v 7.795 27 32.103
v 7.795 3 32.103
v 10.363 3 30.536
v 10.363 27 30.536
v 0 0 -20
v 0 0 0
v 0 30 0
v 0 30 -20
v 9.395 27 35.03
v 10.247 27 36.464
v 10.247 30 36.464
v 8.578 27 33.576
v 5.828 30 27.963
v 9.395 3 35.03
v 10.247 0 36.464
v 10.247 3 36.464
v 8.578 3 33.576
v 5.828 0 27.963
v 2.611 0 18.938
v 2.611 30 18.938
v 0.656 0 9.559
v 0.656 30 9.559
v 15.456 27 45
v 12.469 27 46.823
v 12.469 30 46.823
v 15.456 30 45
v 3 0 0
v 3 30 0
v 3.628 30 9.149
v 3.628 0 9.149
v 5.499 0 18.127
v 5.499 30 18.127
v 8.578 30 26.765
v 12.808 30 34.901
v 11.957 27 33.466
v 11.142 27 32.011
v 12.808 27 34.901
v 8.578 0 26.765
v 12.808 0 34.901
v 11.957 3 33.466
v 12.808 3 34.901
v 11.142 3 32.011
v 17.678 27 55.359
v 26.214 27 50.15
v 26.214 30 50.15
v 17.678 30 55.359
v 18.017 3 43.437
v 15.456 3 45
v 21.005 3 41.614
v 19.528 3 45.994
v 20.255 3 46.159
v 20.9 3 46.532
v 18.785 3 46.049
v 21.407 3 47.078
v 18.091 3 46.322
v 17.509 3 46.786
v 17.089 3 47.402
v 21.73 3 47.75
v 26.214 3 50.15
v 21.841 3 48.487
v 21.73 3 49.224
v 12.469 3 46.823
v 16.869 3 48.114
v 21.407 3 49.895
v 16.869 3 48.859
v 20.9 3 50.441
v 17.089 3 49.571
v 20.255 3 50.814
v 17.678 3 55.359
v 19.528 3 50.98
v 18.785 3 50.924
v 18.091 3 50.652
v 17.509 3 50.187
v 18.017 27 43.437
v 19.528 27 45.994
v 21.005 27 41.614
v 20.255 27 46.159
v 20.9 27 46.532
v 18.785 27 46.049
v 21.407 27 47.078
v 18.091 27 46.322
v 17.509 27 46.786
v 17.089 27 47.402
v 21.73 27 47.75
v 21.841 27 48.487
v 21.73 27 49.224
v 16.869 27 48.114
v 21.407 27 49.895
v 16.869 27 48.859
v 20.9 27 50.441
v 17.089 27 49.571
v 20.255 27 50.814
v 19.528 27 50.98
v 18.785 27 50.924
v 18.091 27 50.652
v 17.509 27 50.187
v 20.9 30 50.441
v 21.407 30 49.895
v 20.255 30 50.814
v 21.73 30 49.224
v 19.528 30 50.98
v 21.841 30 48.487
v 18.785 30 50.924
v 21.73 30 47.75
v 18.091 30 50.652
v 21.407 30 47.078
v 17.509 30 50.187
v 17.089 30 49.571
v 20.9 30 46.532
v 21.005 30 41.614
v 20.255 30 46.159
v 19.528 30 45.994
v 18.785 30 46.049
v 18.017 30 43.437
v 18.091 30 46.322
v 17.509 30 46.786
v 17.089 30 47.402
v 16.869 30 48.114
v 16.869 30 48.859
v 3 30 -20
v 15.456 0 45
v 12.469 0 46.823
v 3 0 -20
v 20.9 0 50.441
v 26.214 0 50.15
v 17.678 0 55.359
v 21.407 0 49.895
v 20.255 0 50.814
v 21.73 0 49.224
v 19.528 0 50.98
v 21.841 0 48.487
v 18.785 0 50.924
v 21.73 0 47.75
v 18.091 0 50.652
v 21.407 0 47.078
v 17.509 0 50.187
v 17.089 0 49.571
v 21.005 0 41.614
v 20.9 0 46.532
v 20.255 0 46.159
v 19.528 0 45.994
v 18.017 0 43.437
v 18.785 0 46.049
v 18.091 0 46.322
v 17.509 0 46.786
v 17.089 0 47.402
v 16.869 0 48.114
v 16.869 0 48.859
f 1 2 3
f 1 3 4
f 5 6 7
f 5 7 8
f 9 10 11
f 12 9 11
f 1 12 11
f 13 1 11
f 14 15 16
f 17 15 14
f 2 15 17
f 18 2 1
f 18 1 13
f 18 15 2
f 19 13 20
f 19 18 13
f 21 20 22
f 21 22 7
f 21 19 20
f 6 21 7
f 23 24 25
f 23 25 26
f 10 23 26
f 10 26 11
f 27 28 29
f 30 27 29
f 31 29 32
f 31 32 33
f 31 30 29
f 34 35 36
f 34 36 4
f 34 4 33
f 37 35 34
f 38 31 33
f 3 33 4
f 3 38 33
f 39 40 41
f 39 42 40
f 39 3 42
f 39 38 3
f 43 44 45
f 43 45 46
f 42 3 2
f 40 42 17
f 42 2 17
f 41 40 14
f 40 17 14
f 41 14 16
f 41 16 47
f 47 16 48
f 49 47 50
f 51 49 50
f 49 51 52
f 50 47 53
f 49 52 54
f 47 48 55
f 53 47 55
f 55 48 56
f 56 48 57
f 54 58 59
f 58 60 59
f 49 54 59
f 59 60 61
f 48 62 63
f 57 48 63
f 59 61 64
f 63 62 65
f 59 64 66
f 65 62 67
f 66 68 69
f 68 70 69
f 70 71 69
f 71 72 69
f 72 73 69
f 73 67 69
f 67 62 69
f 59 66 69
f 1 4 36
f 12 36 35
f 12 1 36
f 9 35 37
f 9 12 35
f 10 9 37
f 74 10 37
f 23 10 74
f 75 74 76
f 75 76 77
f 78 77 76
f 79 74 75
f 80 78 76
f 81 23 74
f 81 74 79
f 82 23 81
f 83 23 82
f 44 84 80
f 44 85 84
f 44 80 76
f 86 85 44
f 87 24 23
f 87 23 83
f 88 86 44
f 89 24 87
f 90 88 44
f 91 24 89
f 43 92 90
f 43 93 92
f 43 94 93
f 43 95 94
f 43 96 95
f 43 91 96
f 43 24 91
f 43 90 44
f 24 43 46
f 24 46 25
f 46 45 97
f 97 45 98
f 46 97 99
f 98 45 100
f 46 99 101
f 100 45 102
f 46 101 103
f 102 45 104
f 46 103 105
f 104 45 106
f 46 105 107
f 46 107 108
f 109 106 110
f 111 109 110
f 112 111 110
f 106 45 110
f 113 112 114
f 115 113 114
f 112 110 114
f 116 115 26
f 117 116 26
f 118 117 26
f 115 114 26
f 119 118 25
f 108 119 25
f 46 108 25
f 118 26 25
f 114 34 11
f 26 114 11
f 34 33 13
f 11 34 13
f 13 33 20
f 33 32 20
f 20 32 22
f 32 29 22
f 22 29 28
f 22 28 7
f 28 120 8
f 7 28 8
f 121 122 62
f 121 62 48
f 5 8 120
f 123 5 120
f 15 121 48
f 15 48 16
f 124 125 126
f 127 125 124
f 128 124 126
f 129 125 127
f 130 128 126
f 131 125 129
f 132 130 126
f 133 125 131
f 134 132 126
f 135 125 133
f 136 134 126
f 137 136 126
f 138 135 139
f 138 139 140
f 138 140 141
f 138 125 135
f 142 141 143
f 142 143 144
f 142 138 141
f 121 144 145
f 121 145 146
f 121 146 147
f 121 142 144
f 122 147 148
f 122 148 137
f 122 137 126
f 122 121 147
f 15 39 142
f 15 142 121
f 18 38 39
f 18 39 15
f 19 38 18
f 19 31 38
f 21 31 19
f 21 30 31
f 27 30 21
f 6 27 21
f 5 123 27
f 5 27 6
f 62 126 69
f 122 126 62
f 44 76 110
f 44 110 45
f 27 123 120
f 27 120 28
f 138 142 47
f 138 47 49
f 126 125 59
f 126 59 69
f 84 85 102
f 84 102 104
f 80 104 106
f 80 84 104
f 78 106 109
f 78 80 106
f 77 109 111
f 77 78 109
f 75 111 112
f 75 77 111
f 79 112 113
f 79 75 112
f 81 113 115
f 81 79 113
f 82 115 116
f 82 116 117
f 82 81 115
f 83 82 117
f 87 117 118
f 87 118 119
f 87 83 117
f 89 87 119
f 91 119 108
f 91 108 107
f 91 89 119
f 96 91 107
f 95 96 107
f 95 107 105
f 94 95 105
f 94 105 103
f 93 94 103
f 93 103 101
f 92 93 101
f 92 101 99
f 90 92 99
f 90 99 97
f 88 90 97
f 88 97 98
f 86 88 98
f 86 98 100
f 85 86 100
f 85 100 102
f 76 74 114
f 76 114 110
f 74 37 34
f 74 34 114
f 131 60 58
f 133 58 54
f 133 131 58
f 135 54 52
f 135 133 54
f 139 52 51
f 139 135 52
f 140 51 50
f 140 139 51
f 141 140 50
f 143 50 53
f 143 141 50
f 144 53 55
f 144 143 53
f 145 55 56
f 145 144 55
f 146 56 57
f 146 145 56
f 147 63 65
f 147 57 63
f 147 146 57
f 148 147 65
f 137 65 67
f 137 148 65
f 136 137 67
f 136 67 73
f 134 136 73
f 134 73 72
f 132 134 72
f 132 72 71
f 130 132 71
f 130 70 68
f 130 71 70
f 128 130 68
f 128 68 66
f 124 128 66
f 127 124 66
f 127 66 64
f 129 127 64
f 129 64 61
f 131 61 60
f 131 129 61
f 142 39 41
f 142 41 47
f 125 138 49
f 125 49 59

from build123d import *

# Parameters (mm, degrees)
ESQUISSE1_R      = 2.5
EXTRUSION1_DEPTH = 30
ESQUISSE3_W      = 25
ESQUISSE3_H      = 24
EXTRUSION2_DEPTH = 47.542124281


with BuildPart() as part:
    # Esquisse1 → Extrusion1 (new body)
    with BuildSketch(Plane(origin=(0, 0, 0), x_dir=(1, 0, 0), z_dir=(0, 1, 0))):
        with BuildLine():
            Line((0, 0), (0, 20))
            Line((0, 20), (3, 20))
            Line((3, 20), (3, 0))
            ThreePointArc((3, 0), (5.498625566, -18.126574307), (12.808140182, -34.901162883))
            Line((12.808140182, -34.901162883), (18.017268971, -43.437261363))
            Line((18.017268971, -43.437261363), (21.004903439, -41.614066287))
            Line((21.004903439, -41.614066287), (26.214032228, -50.150164768))
            Line((26.214032228, -50.150164768), (17.677933747, -55.359293556))
            Line((17.677933747, -55.359293556), (12.468804959, -46.823195076))
            Line((12.468804959, -46.823195076), (15.456439427, -45))
            Line((15.456439427, -45), (10.247310638, -36.46390152))
            ThreePointArc((10.247310638, -36.46390152), (2.610504323, -18.938211963), (0, 0))
        make_face()
        with Locations((19.341418593, -48.486679922)):
            Circle(ESQUISSE1_R, mode=Mode.SUBTRACT)
    extrude(amount=EXTRUSION1_DEPTH)

    # Esquisse3 → Extrusion2 (cut, through all)
    with BuildSketch(Plane(origin=(-11.734839745, 0, 7.161151161), x_dir=(0.520912879, 0, 0.853609848), z_dir=(-0.853609848, 0, 0.520912879))):
        with Locations((43.96390152, 15)):
            Rectangle(ESQUISSE3_W, ESQUISSE3_H)
    extrude(amount=-EXTRUSION2_DEPTH, mode=Mode.SUBTRACT)


solid = part.part
